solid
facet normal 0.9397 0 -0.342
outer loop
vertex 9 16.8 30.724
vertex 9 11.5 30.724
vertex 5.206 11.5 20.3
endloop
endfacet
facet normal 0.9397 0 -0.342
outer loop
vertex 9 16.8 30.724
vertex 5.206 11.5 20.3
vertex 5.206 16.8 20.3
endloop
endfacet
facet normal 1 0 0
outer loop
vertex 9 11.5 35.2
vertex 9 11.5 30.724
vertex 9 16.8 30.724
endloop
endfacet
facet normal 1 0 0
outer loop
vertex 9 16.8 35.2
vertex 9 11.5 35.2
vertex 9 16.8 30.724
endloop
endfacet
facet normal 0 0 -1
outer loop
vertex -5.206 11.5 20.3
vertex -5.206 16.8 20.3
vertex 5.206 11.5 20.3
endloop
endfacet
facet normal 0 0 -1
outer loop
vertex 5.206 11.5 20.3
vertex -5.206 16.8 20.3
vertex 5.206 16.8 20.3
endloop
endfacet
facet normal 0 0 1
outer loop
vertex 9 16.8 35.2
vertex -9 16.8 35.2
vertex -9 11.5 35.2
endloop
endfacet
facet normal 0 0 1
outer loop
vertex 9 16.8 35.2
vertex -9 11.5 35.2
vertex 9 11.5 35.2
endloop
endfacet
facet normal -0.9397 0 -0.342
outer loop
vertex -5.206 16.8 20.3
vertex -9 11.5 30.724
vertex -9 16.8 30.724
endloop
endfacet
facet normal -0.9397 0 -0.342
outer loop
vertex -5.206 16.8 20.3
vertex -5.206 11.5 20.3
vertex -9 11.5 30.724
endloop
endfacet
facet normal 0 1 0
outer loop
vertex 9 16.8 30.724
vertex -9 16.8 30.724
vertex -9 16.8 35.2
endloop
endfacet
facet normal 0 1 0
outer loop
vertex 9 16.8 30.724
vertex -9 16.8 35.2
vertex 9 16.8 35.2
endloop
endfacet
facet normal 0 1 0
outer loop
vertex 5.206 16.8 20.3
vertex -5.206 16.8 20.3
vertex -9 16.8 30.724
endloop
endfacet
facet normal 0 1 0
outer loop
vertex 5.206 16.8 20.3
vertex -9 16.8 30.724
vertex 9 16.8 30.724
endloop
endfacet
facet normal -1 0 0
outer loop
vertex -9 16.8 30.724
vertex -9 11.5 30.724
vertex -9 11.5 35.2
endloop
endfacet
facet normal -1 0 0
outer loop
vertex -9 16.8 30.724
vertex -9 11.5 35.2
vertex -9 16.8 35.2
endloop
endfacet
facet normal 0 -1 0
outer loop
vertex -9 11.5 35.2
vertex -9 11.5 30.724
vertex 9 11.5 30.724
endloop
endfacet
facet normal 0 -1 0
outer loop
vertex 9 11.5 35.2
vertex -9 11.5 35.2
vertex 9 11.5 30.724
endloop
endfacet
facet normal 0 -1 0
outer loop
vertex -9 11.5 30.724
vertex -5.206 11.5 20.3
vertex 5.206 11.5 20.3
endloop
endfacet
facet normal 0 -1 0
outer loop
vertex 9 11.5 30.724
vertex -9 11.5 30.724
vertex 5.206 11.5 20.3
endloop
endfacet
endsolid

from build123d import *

# Parameters (mm, degrees)
BOX406008011_W               = 17.5
BOX406008011_H               = 13.3
BOX406008011_DEPTH           = 19.7
BOX406008011_PLACEMENT_ANGLE = 20
BOX406008010_W               = 17.5
BOX406008010_H               = 13.3
BOX406008010_DEPTH           = 19.7
BOX406008010_PLACEMENT_ANGLE = 20
BOX406008007_W               = 18
BOX406008007_H               = 5.3
BOX406008007_DEPTH           = 14.9


with BuildPart() as cube346:
    # Box406008011 → Box406008011 (new body)
    with BuildSketch(Plane.XY):
        with Locations((8.75, 6.65)):
            Rectangle(BOX406008011_W, BOX406008011_H)
    extrude(amount=BOX406008011_DEPTH)


with BuildPart() as cube346_1:
    # Box406008011 placement: moved
    add(cube346.part.moved(Location((3.75, 6, 30.3))).rotate(Axis((3.75, 6, 30.3), (0, 1, 0)), BOX406008011_PLACEMENT_ANGLE))


with BuildPart() as part_mirroring:
    # Part__Mirroring: instance of Cube346
    add(cube346_1.part.mirror(Plane(origin=(0, 0, 0), x_dir=(0, -1, 0), z_dir=(1, 0, 0))))


with BuildPart() as fusion:
    # Box406008010 → Box406008010 (new body)
    with BuildSketch(Plane.XY):
        with Locations((8.75, 6.65)):
            Rectangle(BOX406008010_W, BOX406008010_H)
    extrude(amount=BOX406008010_DEPTH)


with BuildPart() as fusion_1:
    # Box406008010 placement: moved
    add(fusion.part.moved(Location((3.75, 6, 30.3))).rotate(Axis((3.75, 6, 30.3), (0, 1, 0)), BOX406008010_PLACEMENT_ANGLE))

    # Fusion: union Part__Mirroring
    add(part_mirroring.part)


with BuildPart() as opto_sensor:
    # Box406008007 → Box406008007 (new body)
    with BuildSketch(Plane(origin=(-9, 13, 34.3), x_dir=(1, 0, 0), z_dir=(0, 0, 1))):
        with Locations((9, 2.65)):
            Rectangle(BOX406008007_W, BOX406008007_H)
    extrude(amount=BOX406008007_DEPTH)

    # Cut: cut Fusion
    add(fusion_1.part, mode=Mode.SUBTRACT)


with BuildPart() as opto_sensor_1:
    # Cut placement: moved
    add(opto_sensor.part.moved(Location((0, -1.5, -14))))


solid = opto_sensor_1.part
